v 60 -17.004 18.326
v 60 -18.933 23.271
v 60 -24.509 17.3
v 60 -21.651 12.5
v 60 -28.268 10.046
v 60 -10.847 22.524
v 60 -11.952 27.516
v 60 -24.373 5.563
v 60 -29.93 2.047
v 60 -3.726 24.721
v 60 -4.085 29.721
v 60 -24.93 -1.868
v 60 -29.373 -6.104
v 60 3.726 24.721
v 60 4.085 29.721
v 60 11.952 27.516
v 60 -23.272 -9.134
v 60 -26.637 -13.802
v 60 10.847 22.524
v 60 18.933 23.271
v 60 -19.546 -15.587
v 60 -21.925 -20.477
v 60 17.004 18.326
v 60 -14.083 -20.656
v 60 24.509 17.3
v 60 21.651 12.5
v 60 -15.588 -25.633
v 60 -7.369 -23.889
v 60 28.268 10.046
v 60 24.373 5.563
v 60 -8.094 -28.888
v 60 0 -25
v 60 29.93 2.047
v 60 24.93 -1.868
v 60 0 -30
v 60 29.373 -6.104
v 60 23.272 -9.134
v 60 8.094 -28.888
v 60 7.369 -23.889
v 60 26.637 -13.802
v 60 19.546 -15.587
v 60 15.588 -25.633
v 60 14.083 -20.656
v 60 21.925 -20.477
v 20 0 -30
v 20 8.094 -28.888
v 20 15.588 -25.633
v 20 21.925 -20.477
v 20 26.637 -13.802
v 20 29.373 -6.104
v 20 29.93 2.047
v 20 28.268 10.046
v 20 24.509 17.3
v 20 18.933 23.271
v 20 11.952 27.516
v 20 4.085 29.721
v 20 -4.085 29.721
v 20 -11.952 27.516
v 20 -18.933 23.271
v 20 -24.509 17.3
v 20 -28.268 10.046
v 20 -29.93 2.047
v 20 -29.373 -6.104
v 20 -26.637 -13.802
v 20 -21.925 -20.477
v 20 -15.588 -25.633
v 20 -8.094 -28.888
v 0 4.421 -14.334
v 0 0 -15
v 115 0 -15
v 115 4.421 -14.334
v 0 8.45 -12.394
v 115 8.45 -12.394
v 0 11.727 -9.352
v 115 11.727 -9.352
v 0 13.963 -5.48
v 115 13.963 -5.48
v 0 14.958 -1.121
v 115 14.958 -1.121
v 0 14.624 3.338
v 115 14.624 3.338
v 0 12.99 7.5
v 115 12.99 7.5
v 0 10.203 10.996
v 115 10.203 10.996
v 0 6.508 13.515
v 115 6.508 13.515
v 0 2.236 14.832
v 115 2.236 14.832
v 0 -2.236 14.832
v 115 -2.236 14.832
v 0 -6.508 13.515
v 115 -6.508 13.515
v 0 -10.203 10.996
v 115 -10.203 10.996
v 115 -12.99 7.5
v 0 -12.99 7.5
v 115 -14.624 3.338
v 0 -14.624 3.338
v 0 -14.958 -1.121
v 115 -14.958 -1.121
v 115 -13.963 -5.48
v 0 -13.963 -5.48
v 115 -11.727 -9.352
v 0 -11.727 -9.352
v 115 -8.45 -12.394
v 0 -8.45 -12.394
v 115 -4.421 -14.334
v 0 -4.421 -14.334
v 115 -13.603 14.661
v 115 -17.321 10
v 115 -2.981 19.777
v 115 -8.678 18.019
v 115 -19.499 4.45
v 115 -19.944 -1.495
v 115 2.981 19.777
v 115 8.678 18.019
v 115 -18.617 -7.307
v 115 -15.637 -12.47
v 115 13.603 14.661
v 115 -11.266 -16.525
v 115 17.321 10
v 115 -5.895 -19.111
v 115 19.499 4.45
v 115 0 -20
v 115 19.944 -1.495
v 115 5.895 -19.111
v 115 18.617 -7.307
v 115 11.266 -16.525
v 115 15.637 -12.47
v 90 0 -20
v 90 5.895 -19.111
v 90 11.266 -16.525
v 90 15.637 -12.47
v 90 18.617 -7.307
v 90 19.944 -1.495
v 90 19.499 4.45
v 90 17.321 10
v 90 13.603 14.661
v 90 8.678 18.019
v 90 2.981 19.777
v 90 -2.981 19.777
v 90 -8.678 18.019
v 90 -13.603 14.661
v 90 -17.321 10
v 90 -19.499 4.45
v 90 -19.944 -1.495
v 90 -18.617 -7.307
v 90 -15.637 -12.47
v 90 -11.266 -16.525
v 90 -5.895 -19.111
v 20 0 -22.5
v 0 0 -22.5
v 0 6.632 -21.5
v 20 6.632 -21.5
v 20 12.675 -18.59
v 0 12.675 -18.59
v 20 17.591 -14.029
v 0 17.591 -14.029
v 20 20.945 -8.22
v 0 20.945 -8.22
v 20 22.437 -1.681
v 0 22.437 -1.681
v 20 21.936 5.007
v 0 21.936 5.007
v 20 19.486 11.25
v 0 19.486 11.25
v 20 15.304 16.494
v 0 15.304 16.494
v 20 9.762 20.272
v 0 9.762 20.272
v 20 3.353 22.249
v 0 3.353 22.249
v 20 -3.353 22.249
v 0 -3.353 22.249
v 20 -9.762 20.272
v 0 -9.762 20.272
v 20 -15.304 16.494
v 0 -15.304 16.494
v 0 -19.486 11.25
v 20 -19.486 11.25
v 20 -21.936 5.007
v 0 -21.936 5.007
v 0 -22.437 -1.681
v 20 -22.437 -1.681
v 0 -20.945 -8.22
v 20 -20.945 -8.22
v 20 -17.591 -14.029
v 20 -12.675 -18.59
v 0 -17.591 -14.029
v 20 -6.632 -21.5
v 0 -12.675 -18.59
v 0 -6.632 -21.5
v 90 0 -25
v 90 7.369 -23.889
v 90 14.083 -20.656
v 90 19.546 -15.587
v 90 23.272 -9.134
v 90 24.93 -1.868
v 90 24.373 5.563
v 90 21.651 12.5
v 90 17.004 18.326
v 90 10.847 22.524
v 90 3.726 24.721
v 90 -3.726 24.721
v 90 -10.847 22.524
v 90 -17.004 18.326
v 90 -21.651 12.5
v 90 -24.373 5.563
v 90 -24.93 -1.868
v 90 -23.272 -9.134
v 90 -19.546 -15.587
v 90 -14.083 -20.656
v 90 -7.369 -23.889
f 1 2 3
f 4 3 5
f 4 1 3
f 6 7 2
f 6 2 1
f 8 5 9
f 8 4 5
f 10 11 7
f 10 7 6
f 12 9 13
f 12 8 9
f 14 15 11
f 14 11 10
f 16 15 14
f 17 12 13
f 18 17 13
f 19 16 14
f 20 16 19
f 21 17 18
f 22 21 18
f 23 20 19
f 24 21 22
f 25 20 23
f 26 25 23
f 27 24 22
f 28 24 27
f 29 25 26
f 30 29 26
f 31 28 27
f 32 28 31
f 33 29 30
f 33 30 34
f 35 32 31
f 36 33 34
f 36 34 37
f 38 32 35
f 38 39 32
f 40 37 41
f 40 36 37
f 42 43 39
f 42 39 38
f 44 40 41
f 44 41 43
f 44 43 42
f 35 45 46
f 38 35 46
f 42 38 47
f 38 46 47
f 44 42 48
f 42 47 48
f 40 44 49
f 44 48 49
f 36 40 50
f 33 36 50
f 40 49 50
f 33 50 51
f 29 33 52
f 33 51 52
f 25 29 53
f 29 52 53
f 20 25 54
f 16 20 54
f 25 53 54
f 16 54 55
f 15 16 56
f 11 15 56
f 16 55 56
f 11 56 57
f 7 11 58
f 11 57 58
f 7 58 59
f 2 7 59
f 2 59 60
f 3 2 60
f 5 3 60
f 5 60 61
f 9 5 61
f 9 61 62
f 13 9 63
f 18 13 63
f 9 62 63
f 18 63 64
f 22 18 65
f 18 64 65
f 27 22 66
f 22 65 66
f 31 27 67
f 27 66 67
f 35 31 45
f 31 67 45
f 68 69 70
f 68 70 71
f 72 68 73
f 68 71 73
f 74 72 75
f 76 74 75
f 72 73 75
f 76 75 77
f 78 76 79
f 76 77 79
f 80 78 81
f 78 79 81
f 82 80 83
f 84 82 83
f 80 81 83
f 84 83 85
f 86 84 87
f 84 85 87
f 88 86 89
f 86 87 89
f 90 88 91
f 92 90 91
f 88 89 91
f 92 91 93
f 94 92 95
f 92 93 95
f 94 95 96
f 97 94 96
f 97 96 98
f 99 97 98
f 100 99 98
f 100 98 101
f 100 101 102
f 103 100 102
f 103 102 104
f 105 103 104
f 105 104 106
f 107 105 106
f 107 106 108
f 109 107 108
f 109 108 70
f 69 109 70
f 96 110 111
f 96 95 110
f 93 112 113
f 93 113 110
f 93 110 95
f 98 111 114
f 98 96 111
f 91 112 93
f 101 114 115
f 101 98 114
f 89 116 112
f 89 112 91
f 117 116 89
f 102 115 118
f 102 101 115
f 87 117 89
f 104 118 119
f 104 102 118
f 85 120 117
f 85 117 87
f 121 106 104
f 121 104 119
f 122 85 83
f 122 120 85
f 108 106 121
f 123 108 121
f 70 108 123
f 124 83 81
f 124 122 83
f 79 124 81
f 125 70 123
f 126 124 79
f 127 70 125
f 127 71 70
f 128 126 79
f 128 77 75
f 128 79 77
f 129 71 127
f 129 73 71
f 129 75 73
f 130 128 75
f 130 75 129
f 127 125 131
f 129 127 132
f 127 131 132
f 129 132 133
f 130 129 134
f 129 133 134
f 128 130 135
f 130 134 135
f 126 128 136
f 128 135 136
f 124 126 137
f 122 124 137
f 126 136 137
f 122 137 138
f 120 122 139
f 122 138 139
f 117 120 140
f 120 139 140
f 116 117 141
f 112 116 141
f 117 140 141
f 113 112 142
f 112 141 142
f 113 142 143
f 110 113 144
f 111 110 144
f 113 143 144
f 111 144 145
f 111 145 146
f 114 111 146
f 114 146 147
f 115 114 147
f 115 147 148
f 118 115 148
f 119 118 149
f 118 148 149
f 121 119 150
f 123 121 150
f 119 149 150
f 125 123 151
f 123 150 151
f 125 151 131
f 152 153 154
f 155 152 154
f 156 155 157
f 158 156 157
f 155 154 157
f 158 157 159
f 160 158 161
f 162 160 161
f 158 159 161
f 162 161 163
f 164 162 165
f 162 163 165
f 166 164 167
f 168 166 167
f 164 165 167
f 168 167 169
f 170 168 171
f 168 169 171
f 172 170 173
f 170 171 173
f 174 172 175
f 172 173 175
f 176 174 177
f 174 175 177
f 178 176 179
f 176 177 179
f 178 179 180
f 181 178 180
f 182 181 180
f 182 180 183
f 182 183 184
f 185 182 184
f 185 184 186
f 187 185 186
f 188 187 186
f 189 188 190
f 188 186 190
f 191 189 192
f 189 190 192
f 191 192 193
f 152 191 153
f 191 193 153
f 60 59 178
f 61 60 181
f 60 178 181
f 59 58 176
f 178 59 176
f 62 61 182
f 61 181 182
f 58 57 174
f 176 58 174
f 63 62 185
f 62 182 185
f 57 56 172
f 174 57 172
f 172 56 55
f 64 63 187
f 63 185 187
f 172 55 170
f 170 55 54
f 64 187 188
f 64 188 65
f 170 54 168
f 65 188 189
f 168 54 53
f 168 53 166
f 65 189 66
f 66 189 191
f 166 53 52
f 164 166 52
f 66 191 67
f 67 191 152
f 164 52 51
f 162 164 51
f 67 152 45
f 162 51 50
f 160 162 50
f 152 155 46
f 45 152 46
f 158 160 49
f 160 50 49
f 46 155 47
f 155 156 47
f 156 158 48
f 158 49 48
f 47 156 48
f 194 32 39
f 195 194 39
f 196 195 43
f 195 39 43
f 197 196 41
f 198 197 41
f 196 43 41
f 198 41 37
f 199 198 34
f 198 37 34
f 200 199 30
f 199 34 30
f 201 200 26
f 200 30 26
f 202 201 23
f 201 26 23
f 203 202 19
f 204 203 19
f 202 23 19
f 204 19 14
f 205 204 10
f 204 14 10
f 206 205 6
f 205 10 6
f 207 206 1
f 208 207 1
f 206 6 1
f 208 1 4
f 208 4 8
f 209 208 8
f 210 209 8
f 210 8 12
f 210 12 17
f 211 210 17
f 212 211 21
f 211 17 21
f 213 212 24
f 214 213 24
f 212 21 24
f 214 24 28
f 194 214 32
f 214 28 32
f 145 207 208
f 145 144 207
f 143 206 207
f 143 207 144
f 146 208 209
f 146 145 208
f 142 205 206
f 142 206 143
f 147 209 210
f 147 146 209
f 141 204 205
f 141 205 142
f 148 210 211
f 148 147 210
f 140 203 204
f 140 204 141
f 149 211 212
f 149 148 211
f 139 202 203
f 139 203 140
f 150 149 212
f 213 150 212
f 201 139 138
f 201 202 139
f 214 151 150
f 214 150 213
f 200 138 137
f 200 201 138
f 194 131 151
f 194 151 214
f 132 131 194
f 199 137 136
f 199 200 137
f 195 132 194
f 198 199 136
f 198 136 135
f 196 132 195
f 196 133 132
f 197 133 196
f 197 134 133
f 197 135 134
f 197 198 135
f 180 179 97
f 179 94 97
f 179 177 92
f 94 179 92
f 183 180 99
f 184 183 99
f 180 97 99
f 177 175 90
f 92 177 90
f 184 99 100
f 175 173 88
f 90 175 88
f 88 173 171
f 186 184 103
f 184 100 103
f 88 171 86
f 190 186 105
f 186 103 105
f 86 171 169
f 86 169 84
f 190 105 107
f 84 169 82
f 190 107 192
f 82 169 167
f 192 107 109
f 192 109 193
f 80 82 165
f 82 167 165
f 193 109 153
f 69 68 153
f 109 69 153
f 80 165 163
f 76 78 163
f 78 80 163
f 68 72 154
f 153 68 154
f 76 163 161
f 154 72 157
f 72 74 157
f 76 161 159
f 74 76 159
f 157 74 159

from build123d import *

# Parameters (mm, degrees)
SKETCH1_R           = 22.5
BOSS_EXTRUDE1_DEPTH = 20
SKETCH2_R           = 30
BOSS_EXTRUDE2_DEPTH = 40
SKETCH3_R           = 25
BOSS_EXTRUDE3_DEPTH = 30
SKETCH4_R           = 20
BOSS_EXTRUDE4_DEPTH = 25
SKETCH5_R           = 15
CUT_EXTRUDE1_DEPTH  = 116


with BuildPart() as part:
    # Sketch1 → Boss-Extrude1 (new body)
    with BuildSketch(Plane(origin=(0, 0, 0), x_dir=(0, 0, -1), z_dir=(1, 0, 0))):
        Circle(SKETCH1_R)
    extrude(amount=BOSS_EXTRUDE1_DEPTH)

    # Sketch2 → Boss-Extrude2 (add)
    with BuildSketch(Plane(origin=(20, 0, 0), x_dir=(0, 0, -1), z_dir=(1, 0, 0))):
        Circle(SKETCH2_R)
    extrude(amount=BOSS_EXTRUDE2_DEPTH)

    # Sketch3 → Boss-Extrude3 (add)
    with BuildSketch(Plane(origin=(60, 0, 0), x_dir=(0, 0, -1), z_dir=(1, 0, 0))):
        Circle(SKETCH3_R)
    extrude(amount=BOSS_EXTRUDE3_DEPTH)

    # Sketch4 → Boss-Extrude4 (add)
    with BuildSketch(Plane(origin=(90, 0, 0), x_dir=(0, 0, -1), z_dir=(1, 0, 0))):
        Circle(SKETCH4_R)
    extrude(amount=BOSS_EXTRUDE4_DEPTH)

    # Sketch5 → Cut-Extrude1 (cut, through all)
    with BuildSketch(Plane(origin=(115, 0, 0), x_dir=(0, 0, -1), z_dir=(1, 0, 0))):
        Circle(SKETCH5_R)
    extrude(amount=-CUT_EXTRUDE1_DEPTH, mode=Mode.SUBTRACT)


solid = part.part
